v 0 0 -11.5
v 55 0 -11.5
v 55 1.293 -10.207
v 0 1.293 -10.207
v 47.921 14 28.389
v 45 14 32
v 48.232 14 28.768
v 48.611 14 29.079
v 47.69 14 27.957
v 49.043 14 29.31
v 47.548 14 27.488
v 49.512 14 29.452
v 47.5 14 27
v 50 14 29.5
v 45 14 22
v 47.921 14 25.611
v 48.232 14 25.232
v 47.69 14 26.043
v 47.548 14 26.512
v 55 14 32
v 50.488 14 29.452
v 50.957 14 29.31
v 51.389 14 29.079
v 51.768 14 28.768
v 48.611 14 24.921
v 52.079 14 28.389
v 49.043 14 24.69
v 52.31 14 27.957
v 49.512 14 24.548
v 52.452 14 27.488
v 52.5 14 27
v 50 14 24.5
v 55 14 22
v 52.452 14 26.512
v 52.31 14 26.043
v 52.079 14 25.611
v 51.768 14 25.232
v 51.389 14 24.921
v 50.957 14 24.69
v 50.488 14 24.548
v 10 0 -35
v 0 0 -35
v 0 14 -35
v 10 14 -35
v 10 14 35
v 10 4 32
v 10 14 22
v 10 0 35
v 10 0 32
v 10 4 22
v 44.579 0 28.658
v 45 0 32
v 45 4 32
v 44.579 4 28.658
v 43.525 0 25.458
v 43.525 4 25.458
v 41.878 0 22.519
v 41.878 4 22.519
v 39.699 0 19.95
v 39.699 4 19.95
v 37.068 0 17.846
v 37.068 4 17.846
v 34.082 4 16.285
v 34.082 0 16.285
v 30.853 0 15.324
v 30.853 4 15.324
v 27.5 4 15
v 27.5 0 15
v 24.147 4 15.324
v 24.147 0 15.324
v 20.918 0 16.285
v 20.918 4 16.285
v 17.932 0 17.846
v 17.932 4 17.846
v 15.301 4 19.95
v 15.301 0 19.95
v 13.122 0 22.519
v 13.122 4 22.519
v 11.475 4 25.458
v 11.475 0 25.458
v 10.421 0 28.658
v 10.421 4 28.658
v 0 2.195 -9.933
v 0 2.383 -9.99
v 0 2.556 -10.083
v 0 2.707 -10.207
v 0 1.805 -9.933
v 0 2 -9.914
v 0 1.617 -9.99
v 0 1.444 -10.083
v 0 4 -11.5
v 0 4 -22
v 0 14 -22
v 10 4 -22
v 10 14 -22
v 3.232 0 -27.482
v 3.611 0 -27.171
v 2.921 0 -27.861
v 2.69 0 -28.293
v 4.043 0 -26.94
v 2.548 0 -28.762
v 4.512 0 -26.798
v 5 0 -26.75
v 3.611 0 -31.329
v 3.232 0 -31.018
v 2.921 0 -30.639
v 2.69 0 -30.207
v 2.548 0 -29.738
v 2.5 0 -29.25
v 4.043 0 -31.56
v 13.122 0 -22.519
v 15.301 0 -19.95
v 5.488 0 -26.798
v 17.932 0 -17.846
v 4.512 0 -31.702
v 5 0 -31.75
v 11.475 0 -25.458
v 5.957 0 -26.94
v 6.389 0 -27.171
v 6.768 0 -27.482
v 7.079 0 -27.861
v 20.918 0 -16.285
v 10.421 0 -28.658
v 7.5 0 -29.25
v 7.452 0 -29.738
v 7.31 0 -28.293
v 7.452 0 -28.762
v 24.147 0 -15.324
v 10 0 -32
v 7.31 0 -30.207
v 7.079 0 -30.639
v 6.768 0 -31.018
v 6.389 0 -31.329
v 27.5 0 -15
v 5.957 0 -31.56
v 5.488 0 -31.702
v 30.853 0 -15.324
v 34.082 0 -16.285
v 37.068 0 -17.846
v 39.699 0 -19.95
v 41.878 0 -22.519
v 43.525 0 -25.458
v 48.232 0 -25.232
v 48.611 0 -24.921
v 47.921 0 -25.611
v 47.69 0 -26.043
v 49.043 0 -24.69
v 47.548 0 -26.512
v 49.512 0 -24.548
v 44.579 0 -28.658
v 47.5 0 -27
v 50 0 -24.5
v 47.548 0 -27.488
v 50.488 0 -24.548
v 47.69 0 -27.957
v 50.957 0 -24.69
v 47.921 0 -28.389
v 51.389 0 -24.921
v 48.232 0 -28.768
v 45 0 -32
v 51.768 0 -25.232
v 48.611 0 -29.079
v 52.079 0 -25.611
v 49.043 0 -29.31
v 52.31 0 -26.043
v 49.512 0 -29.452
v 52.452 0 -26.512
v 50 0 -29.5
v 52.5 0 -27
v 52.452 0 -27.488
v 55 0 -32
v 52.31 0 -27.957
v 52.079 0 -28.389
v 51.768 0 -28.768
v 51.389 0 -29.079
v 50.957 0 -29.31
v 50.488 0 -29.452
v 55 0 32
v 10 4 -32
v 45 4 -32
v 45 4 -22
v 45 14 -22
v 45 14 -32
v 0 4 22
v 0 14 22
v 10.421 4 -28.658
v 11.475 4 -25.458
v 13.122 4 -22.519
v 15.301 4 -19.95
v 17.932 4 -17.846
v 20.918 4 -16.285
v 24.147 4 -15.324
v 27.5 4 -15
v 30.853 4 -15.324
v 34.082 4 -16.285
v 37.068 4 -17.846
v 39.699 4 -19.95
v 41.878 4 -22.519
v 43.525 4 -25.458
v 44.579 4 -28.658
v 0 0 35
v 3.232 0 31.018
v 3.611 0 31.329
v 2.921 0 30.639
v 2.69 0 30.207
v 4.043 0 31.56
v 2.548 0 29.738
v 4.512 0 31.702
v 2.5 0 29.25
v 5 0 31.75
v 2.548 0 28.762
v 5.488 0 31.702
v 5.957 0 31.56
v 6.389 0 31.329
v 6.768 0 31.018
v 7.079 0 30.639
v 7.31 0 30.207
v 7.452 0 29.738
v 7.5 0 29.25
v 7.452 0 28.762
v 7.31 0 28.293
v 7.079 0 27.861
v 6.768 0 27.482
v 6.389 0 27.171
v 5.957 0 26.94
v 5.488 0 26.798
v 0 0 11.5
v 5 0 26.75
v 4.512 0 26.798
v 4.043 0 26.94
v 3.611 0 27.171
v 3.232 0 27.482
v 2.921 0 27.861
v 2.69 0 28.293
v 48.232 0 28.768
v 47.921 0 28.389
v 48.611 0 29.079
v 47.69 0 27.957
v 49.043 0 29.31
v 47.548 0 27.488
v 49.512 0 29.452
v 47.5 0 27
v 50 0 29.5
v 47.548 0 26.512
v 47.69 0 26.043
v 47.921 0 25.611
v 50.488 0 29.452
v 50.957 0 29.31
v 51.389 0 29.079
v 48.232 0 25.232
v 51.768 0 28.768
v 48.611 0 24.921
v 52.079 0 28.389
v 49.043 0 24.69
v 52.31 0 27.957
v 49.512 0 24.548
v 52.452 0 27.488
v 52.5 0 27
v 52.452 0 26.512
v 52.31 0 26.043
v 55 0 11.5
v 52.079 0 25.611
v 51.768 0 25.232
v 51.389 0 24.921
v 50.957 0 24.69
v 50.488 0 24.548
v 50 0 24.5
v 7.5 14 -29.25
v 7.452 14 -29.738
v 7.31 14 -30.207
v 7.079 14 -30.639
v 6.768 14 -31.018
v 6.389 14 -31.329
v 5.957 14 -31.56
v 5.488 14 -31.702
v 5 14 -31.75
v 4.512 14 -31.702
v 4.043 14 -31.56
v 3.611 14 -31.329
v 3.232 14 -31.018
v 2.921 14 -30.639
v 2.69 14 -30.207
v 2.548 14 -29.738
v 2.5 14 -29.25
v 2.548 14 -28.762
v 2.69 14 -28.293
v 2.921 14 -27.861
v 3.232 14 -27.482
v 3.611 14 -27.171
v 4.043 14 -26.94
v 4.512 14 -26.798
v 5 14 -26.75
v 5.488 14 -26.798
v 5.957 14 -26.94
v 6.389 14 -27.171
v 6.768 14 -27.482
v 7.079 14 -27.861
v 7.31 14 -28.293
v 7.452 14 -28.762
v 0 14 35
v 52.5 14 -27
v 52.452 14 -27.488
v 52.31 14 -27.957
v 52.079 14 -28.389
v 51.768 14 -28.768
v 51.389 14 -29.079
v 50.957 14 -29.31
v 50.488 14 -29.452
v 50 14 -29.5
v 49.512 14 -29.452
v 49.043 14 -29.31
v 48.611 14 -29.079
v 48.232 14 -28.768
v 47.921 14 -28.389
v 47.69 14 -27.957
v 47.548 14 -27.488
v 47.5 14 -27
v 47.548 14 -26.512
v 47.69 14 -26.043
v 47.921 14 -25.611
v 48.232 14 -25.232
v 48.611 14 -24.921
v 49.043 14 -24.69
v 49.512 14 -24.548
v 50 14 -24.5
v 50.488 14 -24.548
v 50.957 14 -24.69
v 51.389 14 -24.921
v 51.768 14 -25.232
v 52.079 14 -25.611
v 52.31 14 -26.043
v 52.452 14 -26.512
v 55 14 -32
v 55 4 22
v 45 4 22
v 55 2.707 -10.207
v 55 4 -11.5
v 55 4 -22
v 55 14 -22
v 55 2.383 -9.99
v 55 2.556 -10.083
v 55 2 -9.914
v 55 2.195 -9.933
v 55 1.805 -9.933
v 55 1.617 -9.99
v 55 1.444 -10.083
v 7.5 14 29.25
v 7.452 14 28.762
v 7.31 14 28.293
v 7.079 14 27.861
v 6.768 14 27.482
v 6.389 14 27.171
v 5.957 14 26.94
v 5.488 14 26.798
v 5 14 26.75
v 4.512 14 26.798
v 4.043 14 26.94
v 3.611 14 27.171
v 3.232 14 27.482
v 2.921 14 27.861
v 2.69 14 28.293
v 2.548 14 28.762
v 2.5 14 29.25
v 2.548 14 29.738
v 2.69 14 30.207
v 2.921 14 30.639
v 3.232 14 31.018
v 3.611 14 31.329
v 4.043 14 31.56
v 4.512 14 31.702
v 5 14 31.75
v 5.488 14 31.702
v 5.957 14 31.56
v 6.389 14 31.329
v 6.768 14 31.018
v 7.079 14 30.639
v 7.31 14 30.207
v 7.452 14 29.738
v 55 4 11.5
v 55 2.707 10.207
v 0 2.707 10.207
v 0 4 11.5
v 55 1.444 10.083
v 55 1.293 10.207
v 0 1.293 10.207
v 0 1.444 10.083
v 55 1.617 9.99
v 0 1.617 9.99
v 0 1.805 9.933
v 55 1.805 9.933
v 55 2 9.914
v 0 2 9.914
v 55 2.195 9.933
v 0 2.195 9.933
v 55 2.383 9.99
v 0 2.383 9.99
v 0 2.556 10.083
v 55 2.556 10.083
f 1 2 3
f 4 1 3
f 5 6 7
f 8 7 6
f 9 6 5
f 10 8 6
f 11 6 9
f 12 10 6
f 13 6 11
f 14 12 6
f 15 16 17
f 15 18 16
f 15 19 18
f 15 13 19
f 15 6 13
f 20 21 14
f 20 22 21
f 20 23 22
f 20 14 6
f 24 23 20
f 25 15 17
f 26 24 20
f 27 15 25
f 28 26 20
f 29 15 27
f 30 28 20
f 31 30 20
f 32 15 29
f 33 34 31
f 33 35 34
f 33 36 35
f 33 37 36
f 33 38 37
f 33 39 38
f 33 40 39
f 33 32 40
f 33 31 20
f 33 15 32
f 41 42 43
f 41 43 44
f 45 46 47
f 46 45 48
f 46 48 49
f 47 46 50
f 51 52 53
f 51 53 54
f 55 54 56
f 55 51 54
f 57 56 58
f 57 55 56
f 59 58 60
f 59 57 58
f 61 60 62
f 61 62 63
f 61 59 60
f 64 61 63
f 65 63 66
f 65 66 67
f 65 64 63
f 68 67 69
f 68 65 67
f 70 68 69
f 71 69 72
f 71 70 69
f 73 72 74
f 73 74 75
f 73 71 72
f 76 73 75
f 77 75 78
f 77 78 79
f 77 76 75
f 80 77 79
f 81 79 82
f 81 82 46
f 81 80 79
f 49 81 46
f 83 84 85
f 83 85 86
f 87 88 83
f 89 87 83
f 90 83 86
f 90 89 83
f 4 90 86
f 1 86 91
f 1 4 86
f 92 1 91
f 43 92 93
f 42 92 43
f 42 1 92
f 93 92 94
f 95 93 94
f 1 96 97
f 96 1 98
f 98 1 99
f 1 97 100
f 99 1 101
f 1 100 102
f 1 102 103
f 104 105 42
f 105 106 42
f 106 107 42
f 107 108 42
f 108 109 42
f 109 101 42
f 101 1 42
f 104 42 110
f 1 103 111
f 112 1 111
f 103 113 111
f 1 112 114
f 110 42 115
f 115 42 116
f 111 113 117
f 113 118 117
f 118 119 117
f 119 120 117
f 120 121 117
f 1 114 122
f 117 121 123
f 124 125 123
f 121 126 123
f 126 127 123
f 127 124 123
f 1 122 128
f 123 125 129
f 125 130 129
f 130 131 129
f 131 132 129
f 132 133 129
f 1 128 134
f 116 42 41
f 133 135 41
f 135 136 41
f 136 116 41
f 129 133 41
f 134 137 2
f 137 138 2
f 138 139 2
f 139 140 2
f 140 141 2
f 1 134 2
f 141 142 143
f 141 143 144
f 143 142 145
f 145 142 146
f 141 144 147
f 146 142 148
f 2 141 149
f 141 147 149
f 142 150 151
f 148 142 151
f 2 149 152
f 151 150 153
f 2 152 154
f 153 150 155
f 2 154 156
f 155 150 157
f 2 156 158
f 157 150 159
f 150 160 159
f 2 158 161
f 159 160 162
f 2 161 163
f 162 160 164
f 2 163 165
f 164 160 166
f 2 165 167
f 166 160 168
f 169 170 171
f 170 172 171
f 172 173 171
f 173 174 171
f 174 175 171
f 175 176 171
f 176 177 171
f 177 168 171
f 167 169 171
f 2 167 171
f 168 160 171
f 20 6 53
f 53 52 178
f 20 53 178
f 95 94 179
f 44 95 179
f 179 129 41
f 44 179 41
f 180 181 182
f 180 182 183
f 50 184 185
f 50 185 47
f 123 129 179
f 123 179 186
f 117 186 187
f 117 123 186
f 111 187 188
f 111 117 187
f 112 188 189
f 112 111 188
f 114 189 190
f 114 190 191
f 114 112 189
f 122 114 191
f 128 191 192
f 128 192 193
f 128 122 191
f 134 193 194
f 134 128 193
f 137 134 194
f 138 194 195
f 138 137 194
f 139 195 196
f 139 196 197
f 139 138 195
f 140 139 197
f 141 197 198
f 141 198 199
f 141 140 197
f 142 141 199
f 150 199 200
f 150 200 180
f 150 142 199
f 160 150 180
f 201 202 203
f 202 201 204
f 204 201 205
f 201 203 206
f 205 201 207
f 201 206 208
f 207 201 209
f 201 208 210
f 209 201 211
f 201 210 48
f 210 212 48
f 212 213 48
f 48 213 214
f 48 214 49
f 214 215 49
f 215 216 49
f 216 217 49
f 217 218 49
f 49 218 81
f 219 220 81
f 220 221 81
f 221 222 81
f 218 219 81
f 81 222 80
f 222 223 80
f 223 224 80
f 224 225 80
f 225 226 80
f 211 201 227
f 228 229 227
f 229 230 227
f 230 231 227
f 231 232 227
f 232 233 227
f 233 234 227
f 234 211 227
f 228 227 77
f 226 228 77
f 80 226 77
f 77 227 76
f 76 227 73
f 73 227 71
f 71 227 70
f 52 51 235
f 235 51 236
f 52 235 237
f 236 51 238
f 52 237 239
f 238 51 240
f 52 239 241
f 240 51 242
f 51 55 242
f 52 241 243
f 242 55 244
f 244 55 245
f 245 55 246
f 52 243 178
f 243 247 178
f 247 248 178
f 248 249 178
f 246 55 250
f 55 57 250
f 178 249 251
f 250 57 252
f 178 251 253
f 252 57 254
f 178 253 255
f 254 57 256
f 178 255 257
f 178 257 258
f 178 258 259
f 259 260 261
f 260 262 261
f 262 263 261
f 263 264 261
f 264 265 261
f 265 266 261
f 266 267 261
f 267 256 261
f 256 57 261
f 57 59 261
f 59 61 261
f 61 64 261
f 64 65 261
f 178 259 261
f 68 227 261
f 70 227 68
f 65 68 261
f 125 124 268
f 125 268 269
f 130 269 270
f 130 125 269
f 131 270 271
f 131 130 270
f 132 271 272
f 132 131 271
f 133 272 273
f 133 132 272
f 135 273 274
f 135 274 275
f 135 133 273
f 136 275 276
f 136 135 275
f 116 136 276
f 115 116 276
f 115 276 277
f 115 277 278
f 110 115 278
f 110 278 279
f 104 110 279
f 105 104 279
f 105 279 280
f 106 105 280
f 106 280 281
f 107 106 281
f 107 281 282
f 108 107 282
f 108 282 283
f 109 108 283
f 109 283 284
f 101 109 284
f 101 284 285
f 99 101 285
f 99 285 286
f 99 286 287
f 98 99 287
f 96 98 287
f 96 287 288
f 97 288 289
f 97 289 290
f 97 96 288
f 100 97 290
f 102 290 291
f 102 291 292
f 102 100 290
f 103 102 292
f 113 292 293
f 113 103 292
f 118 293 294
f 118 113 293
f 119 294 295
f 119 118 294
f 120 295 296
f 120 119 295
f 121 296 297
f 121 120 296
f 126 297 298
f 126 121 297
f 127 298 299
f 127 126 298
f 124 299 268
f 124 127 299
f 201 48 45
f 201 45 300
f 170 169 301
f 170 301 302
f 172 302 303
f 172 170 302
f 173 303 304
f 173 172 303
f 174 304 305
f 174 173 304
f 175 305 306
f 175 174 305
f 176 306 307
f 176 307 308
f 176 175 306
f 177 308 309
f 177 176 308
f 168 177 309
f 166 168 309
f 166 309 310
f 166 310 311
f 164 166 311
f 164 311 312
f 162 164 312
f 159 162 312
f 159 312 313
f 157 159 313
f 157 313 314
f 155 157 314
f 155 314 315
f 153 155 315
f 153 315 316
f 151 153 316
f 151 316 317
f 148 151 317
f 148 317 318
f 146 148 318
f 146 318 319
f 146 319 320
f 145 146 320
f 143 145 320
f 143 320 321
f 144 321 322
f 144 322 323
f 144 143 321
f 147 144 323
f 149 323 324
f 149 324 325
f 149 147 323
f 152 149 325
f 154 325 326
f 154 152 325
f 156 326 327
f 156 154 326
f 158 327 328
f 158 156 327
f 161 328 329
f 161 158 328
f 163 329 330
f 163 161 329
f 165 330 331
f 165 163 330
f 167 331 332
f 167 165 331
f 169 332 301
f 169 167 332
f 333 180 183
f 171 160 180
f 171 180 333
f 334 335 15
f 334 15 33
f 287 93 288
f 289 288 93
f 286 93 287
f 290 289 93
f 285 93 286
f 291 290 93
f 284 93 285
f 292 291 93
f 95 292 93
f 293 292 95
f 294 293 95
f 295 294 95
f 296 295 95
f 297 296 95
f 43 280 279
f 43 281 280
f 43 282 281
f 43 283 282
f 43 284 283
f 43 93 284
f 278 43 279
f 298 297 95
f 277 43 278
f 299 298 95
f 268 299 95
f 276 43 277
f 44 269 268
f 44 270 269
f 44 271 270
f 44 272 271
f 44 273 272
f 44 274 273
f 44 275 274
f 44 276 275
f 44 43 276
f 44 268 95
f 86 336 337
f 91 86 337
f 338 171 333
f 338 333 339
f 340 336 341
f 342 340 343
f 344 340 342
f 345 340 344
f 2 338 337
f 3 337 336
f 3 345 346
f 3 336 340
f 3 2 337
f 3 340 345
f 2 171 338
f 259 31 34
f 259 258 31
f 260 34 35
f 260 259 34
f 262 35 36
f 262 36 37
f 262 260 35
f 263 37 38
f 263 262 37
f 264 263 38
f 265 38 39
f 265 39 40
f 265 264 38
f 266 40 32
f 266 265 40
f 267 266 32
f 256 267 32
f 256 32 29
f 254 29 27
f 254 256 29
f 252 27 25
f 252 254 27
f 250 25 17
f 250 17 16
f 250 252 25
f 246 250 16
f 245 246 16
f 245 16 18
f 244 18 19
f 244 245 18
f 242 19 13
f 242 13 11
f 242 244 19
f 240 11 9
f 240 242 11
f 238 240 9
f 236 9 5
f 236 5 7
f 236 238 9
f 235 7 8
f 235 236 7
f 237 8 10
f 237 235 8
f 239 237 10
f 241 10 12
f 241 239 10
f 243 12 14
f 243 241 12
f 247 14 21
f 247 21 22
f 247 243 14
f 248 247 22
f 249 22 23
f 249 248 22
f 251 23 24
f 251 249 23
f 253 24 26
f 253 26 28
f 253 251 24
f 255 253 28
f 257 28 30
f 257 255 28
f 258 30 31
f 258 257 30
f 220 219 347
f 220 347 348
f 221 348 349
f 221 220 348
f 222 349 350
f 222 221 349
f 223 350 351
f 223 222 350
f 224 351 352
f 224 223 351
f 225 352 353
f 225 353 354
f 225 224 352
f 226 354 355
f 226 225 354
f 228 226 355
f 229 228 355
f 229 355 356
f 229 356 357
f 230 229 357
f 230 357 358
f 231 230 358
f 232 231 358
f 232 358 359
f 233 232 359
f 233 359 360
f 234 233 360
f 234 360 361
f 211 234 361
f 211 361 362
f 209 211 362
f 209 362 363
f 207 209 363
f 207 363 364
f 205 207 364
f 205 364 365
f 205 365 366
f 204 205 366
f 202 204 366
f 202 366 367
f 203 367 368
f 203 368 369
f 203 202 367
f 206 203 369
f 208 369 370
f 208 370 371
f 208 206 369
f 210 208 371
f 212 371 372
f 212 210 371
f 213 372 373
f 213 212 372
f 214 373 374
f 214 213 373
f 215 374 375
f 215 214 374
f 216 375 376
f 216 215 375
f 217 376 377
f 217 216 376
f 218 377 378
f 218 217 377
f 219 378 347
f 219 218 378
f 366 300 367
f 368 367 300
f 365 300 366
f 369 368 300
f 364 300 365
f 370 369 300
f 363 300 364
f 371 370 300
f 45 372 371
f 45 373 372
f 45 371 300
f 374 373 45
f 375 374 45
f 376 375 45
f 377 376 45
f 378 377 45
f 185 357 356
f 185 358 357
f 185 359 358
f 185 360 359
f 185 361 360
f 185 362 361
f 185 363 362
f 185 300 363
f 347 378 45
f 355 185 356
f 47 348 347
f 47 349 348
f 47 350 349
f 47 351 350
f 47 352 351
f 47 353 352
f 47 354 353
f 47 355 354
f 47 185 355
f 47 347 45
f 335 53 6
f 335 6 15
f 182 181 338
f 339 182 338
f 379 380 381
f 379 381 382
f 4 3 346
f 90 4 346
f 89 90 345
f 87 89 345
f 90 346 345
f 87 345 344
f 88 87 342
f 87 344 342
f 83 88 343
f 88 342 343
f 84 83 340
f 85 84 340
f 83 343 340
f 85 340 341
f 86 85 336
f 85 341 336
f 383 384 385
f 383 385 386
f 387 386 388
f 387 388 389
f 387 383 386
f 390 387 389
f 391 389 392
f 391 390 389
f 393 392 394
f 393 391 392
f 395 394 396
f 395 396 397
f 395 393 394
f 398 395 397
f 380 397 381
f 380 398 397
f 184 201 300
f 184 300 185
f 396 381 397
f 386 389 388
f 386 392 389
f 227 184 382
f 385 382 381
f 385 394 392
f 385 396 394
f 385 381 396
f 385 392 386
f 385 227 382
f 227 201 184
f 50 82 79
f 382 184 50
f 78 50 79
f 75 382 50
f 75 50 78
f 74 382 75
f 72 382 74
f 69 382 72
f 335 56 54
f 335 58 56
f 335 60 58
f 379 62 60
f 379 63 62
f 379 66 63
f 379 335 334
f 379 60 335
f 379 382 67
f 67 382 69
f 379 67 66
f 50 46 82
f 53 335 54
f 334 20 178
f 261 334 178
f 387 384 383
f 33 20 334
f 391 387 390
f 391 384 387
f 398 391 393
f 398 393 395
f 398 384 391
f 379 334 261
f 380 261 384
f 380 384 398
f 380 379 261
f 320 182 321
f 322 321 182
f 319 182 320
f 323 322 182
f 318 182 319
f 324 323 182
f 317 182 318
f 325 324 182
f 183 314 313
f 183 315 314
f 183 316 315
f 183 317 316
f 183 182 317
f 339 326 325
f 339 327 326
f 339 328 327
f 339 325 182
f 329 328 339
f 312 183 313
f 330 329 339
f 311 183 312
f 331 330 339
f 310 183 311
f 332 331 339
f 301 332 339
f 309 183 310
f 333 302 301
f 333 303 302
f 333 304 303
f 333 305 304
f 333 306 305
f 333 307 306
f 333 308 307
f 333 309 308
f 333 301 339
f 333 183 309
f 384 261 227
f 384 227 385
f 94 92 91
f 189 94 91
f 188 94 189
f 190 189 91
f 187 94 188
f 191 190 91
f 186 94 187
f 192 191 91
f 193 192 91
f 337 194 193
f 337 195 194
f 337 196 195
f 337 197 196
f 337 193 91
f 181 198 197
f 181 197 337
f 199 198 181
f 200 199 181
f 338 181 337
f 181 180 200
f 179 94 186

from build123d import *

# Parameters (mm, degrees)
SKETCH1_R           = 2.5
EXTRUDE_BODY_DEPTH  = 4
SKETCH5_W           = 10
SKETCH5_H           = 10
SKETCH5_R           = 2.5
SKETCH5_H_2         = 13
EXTRUDE_LEGS_DEPTH  = 10
SKETCH6_W           = 45
SKETCH6_H           = 0.5
BOSS_EXTRUDE1_DEPTH = 4
CUT_EXTRUDE1_DEPTH  = 55
SKETCH8_W           = 10
SKETCH8_H           = 19
CUT_EXTRUDE2_DEPTH  = 10


with BuildPart() as part:
    # Sketch1 → Extrude-Body (new body)
    with BuildSketch(Plane(origin=(0, 0, 0), x_dir=(1, 0, 0), z_dir=(0, 1, 0))):
        with BuildLine():
            Line((10, 10), (10, -10))
            Line((10, -10), (45, -10))
            Line((45, -10), (55, -10))
            Line((55, -10), (55, -20))
            Line((55, -20), (55, -32))
            Line((55, -32), (45, -32))
            ThreePointArc((45, -32), (27.5, -15), (10, -32))
            Line((10, -32), (10, -35))
            Line((10, -35), (0, -35))
            Line((0, -35), (0, -32))
            Line((0, -32), (0, -20))
            Line((0, -20), (0, 20))
            Line((0, 20), (0, 32))
            Line((0, 32), (0, 35))
            Line((0, 35), (10, 35))
            Line((10, 35), (10, 32))
            ThreePointArc((10, 32), (27.5, 15), (45, 32))
            Line((45, 32), (55, 32))
            Line((55, 32), (55, 20))
            Line((55, 20), (55, 10))
            Line((55, 10), (45, 10))
            Line((45, 10), (10, 10))
        make_face()
        with Locations((50, 27)):
            Circle(SKETCH1_R, mode=Mode.SUBTRACT)
        with Locations((50, -27)):
            Circle(SKETCH1_R, mode=Mode.SUBTRACT)
        with Locations((5, 29.25)):
            Circle(SKETCH1_R, mode=Mode.SUBTRACT)
        with Locations((5, -29.25)):
            Circle(SKETCH1_R, mode=Mode.SUBTRACT)
    extrude(amount=EXTRUDE_BODY_DEPTH)

    # Sketch5 → Extrude-Legs (add)
    with BuildSketch(Plane(origin=(0, 4, 0), x_dir=(1, 0, 0), z_dir=(0, 1, 0))):
        with Locations((50, -27)):
            Rectangle(SKETCH5_W, SKETCH5_H)
        with Locations((50, -27)):
            Circle(SKETCH5_R, mode=Mode.SUBTRACT)
        with Locations((50, 27)):
            Rectangle(SKETCH5_W, SKETCH5_H)
        with Locations((50, 27)):
            Circle(SKETCH5_R, mode=Mode.SUBTRACT)
        with Locations((5, 28.5)):
            Rectangle(SKETCH5_W, SKETCH5_H_2)
        with Locations((5, 29.25)):
            Circle(SKETCH5_R, mode=Mode.SUBTRACT)
        with Locations((5, -28.5)):
            Rectangle(SKETCH5_W, SKETCH5_H_2)
        with Locations((5, -29.25)):
            Circle(SKETCH5_R, mode=Mode.SUBTRACT)
    extrude(amount=EXTRUDE_LEGS_DEPTH)

    # Sketch6 → Boss-Extrude1 (add)
    with BuildSketch(Plane(origin=(0, 4, 0), x_dir=(1, 0, 0), z_dir=(0, 1, 0))):
        with Locations((32.5, -9.75)):
            Rectangle(SKETCH6_W, SKETCH6_H)
        with Locations((32.5, 9.75)):
            Rectangle(SKETCH6_W, SKETCH6_H)
    extrude(amount=-BOSS_EXTRUDE1_DEPTH)

    # Sketch7 → Cut-Extrude1 (cut)
    with BuildSketch(Plane(origin=(55, 0, 0), x_dir=(0, 0, -1), z_dir=(1, 0, 0))):
        with BuildLine():
            Line((-10.207106781, 2.707106781), (-11.5, 4))
            Line((-11.5, 4), (-9.5, 4))
            Line((-9.5, 4), (-9.5, 0))
            Line((-9.5, 0), (-11.5, 0))
            Line((-11.5, 0), (-10.207106781, 1.292893219))
            ThreePointArc((-10.207106781, 1.292893219), (-9.914213562, 2), (-10.207106781, 2.707106781))
        make_face()
        with BuildLine():
            Line((10.207106781, 2.707106781), (11.5, 4))
            Line((11.5, 4), (9.5, 4))
            Line((9.5, 4), (9.5, 0))
            Line((9.5, 0), (11.5, 0))
            Line((11.5, 0), (10.207106781, 1.292893219))
            ThreePointArc((10.207106781, 1.292893219), (9.914213562, 2), (10.207106781, 2.707106781))
        make_face()
    extrude(amount=-CUT_EXTRUDE1_DEPTH, mode=Mode.SUBTRACT)

    # Sketch8 → Cut-Extrude2 (cut)
    with BuildSketch(Plane(origin=(0, 4, 0), x_dir=(1, 0, 0), z_dir=(0, 1, 0))):
        with Locations((5, 0)):
            Rectangle(SKETCH8_W, SKETCH8_H)
    extrude(amount=-CUT_EXTRUDE2_DEPTH, mode=Mode.SUBTRACT)


solid = part.part
